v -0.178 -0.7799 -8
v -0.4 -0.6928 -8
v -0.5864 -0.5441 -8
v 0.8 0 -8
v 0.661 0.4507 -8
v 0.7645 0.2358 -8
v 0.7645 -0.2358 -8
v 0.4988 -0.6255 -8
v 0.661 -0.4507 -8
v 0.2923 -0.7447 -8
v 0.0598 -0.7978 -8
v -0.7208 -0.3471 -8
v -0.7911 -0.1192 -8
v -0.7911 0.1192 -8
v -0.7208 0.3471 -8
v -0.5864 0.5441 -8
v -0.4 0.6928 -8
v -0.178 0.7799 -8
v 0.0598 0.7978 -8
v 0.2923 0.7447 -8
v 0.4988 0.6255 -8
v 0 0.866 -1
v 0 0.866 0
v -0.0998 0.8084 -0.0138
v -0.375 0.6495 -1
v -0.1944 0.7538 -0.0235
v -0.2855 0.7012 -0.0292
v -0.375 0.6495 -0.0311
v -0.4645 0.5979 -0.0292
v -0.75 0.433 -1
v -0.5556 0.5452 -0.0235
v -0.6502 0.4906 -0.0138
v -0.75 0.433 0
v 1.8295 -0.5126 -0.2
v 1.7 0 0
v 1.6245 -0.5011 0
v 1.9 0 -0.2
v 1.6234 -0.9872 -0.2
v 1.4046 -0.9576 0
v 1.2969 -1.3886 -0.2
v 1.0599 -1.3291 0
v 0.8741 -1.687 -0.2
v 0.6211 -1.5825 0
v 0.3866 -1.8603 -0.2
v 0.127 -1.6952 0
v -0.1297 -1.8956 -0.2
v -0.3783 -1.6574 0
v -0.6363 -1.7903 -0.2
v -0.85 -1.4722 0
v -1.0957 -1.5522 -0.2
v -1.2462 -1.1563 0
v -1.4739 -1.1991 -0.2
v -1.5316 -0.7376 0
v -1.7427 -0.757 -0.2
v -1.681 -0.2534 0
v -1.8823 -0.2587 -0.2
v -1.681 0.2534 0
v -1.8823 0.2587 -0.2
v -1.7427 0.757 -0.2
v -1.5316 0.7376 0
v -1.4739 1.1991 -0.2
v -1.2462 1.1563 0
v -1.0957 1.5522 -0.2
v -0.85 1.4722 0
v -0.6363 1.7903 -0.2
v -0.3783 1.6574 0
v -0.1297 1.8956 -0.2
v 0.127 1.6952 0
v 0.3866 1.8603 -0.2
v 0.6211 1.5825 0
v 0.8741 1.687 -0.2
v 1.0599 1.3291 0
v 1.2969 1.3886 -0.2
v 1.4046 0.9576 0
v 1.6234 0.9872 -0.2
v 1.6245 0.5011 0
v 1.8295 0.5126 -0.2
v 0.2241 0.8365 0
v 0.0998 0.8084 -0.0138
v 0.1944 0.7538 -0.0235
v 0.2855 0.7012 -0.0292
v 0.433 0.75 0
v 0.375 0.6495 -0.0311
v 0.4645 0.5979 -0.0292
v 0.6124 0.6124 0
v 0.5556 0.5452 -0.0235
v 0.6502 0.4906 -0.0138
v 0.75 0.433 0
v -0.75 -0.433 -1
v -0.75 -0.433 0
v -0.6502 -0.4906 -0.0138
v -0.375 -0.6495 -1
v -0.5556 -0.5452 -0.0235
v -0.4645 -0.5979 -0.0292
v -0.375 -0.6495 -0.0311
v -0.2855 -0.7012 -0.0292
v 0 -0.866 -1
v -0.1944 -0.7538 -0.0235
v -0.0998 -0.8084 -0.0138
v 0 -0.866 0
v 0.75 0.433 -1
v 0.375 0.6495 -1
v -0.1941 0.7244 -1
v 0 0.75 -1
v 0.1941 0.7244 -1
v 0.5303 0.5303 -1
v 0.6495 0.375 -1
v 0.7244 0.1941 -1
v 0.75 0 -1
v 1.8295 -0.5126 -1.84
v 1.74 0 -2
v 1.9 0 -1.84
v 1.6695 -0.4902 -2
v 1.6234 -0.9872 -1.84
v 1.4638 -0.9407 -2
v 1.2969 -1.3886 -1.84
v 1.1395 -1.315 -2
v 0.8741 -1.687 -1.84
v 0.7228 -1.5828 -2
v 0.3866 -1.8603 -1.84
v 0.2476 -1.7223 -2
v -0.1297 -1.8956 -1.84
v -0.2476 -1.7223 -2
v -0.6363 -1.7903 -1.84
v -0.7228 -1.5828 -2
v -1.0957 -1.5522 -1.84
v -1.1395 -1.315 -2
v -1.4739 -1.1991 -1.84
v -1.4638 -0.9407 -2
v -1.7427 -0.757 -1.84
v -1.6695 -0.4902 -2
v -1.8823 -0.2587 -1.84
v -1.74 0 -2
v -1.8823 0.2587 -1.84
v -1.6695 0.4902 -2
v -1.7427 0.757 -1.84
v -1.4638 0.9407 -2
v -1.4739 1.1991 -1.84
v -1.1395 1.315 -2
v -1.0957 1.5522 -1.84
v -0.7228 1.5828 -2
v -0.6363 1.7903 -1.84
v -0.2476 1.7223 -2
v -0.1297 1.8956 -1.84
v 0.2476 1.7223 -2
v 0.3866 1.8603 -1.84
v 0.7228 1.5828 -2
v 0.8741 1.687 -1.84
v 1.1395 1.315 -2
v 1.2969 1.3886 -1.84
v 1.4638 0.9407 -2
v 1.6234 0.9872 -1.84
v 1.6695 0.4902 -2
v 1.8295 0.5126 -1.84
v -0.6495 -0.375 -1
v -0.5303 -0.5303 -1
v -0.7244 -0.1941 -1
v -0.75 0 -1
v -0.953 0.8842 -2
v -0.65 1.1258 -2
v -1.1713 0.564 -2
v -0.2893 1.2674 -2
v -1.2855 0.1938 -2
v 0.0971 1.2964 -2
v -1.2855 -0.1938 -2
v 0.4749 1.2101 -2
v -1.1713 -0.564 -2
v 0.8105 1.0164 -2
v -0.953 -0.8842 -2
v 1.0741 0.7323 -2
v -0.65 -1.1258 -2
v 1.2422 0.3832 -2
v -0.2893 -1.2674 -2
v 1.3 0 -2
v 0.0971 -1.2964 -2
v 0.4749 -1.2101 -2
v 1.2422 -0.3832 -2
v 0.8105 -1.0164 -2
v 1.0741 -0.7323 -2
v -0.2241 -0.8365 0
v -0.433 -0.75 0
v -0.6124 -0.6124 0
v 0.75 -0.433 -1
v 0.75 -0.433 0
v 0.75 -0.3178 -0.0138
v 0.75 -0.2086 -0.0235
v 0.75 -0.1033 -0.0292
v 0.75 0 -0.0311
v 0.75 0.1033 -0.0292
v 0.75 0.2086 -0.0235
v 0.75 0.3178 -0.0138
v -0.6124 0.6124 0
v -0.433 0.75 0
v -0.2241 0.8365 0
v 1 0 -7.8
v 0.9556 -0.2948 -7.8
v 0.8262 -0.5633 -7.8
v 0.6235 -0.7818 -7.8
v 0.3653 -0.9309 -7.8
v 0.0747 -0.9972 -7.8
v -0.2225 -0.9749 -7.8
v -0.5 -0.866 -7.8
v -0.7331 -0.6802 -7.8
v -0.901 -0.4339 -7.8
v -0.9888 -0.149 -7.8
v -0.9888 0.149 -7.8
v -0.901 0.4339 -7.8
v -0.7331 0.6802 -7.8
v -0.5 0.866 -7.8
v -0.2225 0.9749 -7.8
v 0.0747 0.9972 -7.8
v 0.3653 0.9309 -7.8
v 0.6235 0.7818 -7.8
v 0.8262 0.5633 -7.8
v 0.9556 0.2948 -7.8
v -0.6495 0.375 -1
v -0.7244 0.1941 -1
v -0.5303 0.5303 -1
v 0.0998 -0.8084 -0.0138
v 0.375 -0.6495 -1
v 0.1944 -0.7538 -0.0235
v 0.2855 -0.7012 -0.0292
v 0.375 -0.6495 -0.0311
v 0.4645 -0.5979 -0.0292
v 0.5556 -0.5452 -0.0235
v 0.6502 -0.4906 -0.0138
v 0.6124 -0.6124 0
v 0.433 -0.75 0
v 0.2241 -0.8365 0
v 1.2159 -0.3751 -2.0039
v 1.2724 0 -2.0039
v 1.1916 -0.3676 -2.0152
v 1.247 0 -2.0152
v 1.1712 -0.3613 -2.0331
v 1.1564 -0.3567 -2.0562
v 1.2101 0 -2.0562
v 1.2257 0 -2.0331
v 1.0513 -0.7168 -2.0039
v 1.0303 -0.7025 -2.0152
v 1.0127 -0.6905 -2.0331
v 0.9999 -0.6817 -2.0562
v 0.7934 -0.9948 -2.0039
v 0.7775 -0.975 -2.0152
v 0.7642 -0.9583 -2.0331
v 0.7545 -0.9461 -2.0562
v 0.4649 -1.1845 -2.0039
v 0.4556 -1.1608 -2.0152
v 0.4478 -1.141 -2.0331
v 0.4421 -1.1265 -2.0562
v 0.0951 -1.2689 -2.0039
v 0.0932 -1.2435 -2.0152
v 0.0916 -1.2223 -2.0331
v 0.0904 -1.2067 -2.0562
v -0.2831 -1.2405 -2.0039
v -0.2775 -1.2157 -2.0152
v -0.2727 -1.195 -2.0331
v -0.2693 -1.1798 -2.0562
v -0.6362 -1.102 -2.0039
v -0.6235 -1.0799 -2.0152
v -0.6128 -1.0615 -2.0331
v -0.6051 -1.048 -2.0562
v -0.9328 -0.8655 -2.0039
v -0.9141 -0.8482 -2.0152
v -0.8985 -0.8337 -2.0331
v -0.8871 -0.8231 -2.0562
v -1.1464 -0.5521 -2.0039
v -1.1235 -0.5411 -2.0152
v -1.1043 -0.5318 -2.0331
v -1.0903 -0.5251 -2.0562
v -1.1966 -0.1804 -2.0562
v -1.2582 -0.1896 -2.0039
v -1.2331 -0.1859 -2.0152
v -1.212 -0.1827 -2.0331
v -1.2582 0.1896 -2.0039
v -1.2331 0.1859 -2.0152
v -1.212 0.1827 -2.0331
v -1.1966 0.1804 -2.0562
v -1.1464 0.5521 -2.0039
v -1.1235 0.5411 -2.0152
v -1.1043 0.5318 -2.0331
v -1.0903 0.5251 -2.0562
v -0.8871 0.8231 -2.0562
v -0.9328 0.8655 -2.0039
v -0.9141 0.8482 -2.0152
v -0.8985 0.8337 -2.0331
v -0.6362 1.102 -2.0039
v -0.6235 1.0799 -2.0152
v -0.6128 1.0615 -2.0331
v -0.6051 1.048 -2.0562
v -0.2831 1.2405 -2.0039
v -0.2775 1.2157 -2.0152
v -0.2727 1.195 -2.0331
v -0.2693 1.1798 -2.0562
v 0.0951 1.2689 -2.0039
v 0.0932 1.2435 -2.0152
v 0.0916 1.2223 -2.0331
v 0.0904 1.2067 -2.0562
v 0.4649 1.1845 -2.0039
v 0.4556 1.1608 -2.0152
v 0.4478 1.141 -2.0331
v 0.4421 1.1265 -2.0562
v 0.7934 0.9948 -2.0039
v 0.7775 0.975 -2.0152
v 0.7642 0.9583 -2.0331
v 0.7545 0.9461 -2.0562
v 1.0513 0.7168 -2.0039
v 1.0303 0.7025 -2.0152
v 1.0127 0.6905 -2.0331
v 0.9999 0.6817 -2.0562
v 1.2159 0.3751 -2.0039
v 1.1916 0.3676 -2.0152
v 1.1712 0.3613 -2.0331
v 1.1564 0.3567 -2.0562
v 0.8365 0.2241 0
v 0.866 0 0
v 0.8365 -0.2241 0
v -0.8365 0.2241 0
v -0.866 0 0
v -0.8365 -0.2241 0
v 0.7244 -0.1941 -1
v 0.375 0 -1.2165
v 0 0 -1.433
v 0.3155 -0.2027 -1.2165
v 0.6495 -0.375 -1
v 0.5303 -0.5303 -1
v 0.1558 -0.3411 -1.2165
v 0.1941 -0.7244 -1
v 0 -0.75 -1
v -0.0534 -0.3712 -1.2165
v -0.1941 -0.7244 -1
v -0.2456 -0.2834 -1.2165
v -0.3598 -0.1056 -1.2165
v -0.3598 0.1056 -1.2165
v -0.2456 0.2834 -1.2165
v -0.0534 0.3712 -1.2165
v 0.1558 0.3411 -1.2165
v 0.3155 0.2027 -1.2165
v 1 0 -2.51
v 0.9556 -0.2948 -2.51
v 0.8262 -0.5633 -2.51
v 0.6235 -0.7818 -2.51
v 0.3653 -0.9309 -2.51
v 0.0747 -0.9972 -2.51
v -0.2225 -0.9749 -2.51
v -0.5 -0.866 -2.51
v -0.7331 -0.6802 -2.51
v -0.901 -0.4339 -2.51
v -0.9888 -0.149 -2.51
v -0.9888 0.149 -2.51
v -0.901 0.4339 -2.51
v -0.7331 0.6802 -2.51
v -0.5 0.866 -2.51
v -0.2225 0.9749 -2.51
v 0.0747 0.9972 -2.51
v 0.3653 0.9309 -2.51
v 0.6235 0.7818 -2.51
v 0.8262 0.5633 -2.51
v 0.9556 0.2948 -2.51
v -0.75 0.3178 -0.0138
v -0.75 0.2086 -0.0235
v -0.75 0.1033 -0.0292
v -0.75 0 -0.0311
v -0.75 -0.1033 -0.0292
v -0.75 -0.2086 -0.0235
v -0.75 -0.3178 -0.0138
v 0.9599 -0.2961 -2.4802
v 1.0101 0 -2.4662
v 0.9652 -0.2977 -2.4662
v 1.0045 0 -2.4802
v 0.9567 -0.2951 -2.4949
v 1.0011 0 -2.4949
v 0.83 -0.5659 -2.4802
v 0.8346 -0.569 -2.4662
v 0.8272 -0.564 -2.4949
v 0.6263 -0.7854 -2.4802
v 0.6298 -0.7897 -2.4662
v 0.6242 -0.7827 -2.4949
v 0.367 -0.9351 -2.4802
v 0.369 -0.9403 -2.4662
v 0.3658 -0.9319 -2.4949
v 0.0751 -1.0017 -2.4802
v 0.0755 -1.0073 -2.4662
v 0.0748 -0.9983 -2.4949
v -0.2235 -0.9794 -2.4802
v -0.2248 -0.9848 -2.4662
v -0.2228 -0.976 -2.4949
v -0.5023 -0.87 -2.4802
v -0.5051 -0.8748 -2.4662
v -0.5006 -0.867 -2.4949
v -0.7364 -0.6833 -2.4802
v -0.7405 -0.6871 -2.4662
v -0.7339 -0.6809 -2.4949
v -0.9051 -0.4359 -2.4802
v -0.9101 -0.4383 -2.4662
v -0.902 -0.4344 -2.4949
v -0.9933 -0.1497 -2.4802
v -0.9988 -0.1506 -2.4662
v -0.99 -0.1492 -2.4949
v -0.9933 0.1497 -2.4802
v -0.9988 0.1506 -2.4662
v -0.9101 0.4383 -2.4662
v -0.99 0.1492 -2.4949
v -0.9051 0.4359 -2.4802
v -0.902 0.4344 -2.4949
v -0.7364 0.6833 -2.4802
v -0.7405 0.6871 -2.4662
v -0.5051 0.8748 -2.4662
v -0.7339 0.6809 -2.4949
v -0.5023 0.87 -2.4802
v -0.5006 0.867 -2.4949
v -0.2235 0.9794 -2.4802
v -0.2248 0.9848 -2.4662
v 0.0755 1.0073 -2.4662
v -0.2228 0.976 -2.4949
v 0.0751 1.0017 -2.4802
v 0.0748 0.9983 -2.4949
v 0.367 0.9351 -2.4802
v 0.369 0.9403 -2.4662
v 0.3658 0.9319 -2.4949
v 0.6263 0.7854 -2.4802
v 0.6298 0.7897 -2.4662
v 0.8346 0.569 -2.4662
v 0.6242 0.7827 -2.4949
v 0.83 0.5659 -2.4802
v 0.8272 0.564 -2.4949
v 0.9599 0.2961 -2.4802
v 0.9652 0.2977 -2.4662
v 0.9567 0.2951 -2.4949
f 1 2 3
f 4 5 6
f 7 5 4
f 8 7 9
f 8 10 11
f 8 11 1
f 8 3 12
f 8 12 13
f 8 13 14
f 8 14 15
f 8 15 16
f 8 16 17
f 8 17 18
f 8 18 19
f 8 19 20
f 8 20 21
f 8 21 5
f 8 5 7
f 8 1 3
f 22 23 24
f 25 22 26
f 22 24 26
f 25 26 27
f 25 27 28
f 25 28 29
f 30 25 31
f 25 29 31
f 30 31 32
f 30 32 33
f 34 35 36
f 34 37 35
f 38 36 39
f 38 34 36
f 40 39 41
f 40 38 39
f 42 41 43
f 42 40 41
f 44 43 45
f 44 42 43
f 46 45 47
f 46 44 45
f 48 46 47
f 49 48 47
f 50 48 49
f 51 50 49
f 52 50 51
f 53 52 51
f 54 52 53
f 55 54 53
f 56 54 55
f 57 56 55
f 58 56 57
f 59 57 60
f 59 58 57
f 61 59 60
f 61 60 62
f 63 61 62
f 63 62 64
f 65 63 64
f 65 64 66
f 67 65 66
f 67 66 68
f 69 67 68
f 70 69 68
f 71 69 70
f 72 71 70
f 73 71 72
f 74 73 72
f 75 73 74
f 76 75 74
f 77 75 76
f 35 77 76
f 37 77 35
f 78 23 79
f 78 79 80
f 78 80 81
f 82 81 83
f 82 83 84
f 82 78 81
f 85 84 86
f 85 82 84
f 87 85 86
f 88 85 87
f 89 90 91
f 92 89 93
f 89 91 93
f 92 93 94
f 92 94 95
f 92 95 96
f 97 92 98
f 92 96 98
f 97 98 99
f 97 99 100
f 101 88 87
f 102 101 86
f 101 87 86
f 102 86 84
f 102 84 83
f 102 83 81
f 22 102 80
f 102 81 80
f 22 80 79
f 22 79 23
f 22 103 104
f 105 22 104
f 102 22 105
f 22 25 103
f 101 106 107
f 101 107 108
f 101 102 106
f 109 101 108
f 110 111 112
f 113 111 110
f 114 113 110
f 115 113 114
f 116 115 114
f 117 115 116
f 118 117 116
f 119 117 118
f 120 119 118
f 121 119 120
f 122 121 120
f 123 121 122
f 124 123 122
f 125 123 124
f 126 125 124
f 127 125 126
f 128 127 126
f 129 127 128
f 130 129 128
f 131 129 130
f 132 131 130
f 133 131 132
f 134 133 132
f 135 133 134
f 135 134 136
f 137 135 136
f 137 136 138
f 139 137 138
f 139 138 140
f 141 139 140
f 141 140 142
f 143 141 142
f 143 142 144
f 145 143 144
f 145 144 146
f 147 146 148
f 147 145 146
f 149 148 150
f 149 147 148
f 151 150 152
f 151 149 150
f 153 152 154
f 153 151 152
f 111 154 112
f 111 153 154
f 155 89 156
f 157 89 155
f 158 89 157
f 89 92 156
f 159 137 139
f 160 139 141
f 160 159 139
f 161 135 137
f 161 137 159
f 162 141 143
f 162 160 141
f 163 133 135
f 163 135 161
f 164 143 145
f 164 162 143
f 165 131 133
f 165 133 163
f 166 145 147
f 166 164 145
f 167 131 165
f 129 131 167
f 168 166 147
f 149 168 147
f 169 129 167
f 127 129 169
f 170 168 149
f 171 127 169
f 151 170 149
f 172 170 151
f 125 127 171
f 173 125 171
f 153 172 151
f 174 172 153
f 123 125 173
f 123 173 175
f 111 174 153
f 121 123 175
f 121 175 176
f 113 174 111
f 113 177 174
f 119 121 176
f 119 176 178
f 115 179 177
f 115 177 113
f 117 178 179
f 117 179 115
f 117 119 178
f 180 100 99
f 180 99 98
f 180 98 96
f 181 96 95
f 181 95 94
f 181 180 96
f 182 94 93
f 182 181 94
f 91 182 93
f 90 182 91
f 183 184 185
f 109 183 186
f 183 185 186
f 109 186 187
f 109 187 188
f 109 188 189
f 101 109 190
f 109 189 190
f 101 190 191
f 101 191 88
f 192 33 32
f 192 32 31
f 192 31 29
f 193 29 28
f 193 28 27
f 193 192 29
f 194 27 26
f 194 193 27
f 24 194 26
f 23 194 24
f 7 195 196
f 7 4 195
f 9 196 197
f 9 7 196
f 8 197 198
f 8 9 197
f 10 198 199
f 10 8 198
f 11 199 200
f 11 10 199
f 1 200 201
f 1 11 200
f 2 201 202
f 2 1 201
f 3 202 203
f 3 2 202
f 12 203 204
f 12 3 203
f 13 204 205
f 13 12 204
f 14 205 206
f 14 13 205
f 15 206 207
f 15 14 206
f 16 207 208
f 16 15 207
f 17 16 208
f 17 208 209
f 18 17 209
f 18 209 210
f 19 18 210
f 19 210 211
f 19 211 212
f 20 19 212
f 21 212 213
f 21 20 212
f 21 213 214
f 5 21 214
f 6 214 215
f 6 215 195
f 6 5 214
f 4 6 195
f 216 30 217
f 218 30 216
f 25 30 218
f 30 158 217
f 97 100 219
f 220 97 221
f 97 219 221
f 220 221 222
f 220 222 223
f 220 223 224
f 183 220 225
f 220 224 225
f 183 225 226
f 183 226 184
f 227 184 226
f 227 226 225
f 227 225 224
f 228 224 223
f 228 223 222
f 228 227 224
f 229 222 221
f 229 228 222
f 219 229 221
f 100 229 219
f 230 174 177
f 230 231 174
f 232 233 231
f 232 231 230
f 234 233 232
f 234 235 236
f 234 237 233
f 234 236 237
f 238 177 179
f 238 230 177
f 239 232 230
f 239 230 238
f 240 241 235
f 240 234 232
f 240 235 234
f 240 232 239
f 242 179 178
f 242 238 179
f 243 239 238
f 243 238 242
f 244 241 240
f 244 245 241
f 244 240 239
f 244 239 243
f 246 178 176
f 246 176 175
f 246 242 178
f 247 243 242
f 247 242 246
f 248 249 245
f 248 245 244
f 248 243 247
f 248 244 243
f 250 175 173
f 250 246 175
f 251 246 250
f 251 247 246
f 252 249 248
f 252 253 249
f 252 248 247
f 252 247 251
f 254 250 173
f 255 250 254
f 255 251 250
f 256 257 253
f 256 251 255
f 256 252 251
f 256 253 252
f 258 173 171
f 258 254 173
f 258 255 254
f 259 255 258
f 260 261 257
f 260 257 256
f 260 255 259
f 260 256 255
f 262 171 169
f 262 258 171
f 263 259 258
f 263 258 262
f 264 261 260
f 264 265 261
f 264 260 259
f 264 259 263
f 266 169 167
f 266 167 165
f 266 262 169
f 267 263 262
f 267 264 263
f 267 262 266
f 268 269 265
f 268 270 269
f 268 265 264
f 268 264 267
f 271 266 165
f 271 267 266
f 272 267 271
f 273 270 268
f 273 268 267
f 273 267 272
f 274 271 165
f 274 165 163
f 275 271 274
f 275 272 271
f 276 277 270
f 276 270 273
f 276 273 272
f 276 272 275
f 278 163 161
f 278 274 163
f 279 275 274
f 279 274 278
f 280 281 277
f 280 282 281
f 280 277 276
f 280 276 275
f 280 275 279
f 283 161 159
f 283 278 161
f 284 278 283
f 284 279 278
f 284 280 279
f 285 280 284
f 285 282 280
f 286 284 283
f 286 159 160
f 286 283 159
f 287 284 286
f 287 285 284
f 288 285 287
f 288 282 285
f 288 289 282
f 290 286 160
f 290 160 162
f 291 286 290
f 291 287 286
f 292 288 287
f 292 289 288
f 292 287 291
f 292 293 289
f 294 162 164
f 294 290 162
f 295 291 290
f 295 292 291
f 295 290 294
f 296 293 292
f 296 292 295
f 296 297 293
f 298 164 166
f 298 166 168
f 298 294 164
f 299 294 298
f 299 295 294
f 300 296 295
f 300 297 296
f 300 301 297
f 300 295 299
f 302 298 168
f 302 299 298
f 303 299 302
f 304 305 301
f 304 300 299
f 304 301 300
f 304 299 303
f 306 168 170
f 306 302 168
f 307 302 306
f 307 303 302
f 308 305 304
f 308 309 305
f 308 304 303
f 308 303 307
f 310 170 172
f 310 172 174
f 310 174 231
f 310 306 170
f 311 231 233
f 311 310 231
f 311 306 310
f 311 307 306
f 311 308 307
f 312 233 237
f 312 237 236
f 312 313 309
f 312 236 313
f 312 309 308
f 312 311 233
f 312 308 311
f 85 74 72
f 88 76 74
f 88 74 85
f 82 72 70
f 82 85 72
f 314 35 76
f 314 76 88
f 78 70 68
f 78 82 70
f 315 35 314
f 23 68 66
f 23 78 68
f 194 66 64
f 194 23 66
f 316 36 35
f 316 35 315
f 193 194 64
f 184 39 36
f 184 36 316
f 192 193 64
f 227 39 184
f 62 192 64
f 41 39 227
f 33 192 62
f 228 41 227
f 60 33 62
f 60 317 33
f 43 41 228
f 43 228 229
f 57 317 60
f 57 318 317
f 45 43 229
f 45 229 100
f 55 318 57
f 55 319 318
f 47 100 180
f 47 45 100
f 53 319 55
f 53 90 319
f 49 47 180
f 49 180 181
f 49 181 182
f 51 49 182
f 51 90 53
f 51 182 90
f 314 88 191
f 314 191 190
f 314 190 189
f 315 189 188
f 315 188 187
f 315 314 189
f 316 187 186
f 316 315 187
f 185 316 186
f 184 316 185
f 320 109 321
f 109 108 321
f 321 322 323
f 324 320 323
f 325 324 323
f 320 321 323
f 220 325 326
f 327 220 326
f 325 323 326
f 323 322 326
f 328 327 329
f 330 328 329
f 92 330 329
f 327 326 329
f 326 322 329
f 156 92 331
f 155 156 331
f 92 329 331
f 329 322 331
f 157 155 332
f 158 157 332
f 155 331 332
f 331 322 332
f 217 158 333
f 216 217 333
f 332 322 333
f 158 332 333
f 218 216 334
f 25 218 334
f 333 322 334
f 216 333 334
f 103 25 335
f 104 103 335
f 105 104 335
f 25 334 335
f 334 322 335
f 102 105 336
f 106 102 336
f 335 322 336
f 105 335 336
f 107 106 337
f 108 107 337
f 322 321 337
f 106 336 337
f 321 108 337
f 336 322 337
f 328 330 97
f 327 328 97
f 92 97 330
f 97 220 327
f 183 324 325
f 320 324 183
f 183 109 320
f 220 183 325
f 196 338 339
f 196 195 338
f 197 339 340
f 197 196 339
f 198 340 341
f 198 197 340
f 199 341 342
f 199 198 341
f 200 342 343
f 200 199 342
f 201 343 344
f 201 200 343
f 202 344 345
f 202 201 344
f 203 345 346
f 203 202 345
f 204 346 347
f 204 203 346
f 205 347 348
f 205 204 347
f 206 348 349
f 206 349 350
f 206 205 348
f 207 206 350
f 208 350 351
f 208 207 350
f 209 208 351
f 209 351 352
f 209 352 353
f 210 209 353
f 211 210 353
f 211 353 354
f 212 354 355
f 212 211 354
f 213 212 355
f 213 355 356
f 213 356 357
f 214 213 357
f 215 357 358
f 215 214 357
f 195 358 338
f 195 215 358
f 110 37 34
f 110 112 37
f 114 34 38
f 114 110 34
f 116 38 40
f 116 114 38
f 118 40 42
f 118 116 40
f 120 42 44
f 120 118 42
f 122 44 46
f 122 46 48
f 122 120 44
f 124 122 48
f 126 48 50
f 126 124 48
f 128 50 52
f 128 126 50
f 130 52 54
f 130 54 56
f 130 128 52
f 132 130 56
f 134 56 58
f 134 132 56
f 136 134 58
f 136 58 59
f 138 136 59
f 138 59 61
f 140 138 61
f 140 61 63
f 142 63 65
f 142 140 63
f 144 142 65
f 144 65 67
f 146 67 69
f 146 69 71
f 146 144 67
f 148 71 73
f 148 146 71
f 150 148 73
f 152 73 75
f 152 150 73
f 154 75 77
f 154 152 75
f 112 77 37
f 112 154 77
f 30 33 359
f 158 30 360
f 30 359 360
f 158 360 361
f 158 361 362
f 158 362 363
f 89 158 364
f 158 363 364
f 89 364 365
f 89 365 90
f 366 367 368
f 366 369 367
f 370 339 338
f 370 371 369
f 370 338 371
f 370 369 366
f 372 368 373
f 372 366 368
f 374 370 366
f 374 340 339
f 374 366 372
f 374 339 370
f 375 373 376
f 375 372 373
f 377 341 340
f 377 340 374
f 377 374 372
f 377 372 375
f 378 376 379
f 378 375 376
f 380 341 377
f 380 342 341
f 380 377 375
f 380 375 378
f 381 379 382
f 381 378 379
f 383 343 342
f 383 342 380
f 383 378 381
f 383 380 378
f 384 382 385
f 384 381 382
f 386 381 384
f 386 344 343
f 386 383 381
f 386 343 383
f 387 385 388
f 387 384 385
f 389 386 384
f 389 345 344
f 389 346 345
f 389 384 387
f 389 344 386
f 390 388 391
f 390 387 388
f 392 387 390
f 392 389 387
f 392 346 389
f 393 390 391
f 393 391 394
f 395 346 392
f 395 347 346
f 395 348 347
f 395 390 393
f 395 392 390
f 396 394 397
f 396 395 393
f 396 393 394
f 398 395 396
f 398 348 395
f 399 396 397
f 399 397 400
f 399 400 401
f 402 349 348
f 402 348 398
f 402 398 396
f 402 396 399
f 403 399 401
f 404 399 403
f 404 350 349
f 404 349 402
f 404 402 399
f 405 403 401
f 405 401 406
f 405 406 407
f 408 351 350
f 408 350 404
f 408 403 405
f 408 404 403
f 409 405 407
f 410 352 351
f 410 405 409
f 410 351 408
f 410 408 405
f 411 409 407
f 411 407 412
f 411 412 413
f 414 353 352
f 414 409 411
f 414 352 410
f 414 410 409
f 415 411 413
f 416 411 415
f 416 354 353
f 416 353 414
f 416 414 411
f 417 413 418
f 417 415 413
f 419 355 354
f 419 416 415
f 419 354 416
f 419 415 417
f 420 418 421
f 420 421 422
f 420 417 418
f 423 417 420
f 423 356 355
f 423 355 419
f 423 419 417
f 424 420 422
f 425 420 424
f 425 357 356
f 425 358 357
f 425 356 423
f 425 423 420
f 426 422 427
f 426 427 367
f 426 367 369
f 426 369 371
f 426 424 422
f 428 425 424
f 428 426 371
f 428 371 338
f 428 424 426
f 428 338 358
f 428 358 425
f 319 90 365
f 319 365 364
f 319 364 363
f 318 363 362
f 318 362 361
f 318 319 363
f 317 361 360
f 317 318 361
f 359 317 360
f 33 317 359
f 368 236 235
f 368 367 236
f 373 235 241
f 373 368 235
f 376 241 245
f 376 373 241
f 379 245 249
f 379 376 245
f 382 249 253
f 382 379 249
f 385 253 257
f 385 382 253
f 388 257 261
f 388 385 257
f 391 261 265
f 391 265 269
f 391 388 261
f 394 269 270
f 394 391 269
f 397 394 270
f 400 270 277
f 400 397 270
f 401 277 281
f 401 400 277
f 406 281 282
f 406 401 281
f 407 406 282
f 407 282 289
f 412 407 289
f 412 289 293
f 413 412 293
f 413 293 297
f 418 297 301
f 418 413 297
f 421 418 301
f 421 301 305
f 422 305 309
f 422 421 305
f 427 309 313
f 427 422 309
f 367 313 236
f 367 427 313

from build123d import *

# Parameters (mm, degrees)
CUT_EXTRUDE1_DEPTH = 1


with BuildPart() as part:
    # Sketch1 → Revolve1 (revolve)
    with BuildSketch(Plane(origin=(0, 0, 0), x_dir=(0, 0, -1), z_dir=(1, 0, 0)), mode=Mode.PRIVATE) as revolve1_sk:
        with BuildLine():
            Line((0, 0), (0, 1.7))
            Line((0, 1.7), (0.2, 1.9))
            Line((0.2, 1.9), (1.84, 1.9))
            Line((1.84, 1.9), (2, 1.74))
            Line((2, 1.74), (2, 1.3))
            ThreePointArc((2, 1.3), (2.015193643, 1.24701055), (2.056157637, 1.210123155))
            Line((2.056157637, 1.210123155), (2.466157637, 1.010123155))
            ThreePointArc((2.466157637, 1.010123155), (2.48750205, 1.00256365), (2.51, 1))
            Line((2.51, 1), (7.8, 1))
            Line((7.8, 1), (8, 0.8))
            Line((8, 0.8), (8, 0))
            Line((8, 0), (0, 0))
        make_face()
    revolve(revolve1_sk.sketch.rotate(Axis((0, 0, 0), (0, 0, -1)), 90), axis=Axis((0, 0, 0), (0, 0, -1)))

    # Sketch2 → Cut-Extrude1 (cut)
    with BuildSketch(Plane.XY):
        Polygon((0, 0.866025404), (-0.75, 0.433012702), (-0.75, -0.433012702), (0, -0.866025404), (0.75, -0.433012702), (0.75, 0.433012702), align=None)
    extrude(amount=-CUT_EXTRUDE1_DEPTH, mode=Mode.SUBTRACT)

    # Sketch3 → Cut-Revolve2 (revolve, cut)
    with BuildSketch(Plane(origin=(0, 0, 0), x_dir=(0, 0, -1), z_dir=(1, 0, 0)), mode=Mode.PRIVATE) as cut_revolve2_sk:
        Polygon((1, 0), (1, 0.75), (1.433012702, 0), align=None)
    revolve(cut_revolve2_sk.sketch.rotate(Axis((0, 0, -1), (0, 0, -1)), 90), axis=Axis((0, 0, -1), (0, 0, -1)), mode=Mode.SUBTRACT)

    # Sketch4 → Cut-Revolve3 (revolve, cut)
    with BuildSketch(Plane(origin=(0, 0, 0), x_dir=(0, 0, -1), z_dir=(1, 0, 0))):
        Polygon((0, 0.866025404), (0, 0.75), (0.031088913, 0.75), align=None)
    revolve(axis=Axis((0, 0, 0), (0, 0, -1)), mode=Mode.SUBTRACT)


solid = part.part
